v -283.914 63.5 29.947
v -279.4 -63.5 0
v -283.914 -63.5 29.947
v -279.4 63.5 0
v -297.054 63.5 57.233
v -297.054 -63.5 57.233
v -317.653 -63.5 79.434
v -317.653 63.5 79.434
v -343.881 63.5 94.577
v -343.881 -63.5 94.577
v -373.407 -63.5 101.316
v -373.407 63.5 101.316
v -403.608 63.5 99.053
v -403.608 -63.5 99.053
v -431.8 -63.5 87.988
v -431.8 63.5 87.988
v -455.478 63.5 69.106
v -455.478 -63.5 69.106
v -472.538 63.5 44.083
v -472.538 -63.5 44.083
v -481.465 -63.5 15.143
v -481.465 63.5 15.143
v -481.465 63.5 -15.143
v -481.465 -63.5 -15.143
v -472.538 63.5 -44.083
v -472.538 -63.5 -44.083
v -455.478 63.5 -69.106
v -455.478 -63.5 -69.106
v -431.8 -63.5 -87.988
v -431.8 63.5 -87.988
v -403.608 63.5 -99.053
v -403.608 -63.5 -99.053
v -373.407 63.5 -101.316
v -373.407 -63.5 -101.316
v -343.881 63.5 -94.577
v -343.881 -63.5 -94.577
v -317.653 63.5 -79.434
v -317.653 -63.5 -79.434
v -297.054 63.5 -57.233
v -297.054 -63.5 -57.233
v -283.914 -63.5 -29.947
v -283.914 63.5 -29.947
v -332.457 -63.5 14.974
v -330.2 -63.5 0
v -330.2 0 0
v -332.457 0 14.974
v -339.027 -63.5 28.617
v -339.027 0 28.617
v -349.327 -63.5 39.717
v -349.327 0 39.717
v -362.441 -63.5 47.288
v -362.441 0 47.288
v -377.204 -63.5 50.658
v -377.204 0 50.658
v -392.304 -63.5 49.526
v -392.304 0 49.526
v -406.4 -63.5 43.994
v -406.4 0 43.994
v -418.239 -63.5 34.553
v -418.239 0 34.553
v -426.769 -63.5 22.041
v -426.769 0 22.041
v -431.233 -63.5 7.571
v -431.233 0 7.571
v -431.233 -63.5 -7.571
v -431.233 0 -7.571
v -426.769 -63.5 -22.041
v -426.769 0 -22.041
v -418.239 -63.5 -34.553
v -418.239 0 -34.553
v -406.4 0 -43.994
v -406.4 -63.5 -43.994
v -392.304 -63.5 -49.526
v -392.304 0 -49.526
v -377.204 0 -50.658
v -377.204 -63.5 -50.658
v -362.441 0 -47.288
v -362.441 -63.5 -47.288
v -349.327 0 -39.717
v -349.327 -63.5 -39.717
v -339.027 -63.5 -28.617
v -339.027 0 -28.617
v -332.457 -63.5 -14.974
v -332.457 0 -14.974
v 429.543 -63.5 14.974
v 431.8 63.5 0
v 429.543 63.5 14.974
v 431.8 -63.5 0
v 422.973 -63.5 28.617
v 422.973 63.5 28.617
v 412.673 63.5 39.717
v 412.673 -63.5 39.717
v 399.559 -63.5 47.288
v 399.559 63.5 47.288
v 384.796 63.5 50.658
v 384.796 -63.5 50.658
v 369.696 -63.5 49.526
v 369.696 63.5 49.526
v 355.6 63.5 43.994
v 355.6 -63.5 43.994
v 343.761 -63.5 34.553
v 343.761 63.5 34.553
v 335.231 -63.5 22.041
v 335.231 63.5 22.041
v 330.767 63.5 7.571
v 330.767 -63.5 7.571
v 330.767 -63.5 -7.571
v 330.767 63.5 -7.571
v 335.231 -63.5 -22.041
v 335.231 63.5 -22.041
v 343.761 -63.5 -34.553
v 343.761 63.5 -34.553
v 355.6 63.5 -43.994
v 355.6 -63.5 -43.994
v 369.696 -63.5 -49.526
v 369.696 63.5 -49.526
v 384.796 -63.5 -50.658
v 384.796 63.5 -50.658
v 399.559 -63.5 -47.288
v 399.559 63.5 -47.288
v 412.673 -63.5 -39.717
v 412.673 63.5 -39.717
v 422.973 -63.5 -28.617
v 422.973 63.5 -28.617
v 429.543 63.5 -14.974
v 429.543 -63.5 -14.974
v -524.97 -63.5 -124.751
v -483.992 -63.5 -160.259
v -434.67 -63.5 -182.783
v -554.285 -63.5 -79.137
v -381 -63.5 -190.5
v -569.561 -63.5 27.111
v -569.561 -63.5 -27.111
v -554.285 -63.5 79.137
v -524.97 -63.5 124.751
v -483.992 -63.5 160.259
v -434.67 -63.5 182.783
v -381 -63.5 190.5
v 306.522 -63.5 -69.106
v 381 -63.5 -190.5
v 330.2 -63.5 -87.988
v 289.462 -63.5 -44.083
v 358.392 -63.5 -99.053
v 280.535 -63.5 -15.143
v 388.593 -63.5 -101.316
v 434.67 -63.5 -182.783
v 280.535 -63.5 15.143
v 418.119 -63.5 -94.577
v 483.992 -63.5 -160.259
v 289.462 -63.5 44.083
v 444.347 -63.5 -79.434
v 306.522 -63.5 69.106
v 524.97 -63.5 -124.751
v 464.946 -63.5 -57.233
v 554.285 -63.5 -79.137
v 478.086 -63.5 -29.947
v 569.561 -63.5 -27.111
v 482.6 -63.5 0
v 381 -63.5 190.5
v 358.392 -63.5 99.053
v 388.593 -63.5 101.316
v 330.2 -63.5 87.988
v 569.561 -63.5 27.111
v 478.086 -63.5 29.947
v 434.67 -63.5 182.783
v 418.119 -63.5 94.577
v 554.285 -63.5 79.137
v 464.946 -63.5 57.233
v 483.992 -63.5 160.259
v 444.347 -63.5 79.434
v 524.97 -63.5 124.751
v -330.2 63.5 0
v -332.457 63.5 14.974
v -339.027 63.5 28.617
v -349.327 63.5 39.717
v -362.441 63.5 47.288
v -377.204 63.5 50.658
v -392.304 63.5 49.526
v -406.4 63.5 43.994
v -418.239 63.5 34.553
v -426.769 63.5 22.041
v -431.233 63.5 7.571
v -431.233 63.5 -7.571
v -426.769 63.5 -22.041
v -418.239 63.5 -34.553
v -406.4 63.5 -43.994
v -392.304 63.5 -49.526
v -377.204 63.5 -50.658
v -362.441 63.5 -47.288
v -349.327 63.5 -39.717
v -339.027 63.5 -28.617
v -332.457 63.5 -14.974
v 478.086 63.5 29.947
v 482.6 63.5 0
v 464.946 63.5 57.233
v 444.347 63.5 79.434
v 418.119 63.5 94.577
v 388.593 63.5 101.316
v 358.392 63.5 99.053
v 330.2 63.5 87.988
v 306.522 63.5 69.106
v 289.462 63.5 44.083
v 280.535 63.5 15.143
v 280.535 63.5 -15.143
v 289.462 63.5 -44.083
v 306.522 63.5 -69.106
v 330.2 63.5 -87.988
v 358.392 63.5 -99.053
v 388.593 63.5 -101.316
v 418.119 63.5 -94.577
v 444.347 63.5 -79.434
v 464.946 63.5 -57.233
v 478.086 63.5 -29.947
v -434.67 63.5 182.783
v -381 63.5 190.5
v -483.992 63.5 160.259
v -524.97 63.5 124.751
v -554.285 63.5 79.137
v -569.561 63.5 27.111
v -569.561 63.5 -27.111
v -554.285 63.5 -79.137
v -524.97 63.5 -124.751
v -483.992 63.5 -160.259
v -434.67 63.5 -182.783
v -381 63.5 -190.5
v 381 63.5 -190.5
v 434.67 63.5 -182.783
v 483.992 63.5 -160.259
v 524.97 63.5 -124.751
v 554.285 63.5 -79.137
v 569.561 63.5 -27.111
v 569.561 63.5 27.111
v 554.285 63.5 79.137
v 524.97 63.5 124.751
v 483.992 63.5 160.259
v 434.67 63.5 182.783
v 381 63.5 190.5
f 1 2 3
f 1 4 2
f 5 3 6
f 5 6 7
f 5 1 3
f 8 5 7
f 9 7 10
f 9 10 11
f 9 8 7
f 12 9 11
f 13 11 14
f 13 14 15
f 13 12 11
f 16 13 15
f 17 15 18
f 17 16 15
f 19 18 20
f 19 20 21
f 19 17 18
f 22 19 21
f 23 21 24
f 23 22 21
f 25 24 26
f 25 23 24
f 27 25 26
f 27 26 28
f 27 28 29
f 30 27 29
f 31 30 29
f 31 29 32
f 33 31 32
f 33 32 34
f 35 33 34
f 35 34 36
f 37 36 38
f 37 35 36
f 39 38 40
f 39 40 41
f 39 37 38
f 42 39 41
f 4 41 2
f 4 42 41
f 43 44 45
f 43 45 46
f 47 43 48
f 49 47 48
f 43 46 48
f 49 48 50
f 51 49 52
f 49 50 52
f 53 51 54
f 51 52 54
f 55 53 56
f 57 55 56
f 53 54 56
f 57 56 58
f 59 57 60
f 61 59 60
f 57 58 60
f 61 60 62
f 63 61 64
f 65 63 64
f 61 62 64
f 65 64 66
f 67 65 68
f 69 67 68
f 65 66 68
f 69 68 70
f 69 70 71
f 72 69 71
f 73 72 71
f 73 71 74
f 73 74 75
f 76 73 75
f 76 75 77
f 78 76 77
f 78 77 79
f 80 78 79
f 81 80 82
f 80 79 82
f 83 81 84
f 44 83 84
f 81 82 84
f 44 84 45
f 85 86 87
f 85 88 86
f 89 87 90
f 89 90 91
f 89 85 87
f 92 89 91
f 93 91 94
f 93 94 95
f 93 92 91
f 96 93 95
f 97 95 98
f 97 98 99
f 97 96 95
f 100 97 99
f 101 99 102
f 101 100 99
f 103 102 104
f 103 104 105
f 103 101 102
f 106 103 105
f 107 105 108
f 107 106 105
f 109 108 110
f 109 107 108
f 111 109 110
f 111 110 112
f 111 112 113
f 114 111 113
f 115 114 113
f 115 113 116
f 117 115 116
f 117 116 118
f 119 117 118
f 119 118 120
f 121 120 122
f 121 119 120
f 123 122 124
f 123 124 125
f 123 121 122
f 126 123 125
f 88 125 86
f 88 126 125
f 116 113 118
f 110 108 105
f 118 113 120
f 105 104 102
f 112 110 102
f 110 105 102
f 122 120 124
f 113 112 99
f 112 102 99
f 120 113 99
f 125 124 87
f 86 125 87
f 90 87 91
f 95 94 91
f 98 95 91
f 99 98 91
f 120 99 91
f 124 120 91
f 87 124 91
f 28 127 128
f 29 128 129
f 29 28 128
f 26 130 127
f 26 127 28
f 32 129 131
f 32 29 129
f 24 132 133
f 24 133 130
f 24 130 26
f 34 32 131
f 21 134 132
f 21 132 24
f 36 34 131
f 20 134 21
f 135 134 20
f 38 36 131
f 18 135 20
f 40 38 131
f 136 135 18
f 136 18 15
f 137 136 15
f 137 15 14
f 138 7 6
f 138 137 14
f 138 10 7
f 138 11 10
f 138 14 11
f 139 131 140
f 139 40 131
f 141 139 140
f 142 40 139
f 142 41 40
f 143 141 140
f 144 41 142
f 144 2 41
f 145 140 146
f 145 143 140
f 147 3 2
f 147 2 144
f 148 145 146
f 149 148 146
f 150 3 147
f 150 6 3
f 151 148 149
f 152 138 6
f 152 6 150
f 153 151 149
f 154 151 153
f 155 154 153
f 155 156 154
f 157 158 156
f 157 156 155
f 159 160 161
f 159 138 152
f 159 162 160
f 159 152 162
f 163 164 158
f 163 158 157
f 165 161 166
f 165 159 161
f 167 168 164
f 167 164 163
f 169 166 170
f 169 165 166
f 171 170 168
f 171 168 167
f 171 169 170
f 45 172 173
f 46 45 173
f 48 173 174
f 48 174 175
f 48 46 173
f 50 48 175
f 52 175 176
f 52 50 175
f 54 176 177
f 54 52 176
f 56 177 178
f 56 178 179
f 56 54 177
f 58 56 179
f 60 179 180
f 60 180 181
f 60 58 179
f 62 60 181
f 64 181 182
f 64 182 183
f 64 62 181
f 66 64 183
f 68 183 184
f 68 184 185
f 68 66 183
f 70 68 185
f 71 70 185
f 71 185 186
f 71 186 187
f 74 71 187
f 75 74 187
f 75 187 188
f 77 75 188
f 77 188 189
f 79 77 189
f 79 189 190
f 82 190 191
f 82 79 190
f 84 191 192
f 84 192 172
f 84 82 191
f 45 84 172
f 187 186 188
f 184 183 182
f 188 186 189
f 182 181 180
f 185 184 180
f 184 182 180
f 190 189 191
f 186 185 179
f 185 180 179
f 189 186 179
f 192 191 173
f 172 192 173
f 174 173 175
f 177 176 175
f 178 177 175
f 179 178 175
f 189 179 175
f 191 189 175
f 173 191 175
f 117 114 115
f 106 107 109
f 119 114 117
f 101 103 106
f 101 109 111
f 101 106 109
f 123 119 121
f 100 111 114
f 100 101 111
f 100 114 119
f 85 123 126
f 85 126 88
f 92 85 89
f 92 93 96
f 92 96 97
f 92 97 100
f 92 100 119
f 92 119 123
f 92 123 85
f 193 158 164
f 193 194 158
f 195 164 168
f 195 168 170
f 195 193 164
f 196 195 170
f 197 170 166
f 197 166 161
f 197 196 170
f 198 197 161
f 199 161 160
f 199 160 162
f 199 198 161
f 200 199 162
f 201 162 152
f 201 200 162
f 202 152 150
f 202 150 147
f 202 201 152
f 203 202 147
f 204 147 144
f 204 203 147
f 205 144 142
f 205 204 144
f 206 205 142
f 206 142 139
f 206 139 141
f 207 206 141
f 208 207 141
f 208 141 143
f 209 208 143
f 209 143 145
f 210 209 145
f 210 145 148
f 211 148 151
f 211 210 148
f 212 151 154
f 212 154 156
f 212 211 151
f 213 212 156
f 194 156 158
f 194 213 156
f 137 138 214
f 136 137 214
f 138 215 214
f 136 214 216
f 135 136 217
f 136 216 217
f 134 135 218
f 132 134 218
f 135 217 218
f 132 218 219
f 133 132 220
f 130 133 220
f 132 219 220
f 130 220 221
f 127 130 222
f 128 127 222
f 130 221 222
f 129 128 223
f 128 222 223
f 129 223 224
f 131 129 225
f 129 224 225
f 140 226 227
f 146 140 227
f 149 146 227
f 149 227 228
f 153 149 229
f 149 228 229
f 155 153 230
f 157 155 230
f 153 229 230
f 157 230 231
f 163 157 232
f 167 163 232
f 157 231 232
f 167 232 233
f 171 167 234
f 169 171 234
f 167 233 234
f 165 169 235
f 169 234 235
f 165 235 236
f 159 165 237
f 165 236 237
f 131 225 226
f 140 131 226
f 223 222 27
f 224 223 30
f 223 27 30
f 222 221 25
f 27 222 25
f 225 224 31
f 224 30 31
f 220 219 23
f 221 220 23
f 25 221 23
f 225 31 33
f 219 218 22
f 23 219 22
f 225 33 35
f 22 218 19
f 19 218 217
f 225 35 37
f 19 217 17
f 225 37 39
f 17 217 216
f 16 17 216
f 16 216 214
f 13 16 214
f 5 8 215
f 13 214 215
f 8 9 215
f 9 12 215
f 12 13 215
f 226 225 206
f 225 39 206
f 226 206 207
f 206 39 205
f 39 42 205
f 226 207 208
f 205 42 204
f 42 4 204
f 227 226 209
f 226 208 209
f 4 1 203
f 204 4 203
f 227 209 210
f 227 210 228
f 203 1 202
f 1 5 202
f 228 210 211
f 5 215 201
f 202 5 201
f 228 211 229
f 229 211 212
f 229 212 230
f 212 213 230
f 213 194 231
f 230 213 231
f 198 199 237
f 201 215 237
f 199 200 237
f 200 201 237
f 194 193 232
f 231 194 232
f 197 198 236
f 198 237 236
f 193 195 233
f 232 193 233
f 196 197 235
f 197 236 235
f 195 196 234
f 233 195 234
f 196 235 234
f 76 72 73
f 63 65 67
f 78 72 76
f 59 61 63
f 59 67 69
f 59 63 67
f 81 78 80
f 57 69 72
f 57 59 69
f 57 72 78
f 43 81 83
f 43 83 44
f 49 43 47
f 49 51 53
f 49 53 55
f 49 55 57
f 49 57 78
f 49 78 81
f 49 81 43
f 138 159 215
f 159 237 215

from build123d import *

# Parameters (mm, degrees)
F0_R     = 101.6
F0_R_2   = 50.8
F1_DEPTH = 63.5


with BuildPart() as f1:
    # F0 (on Front) → F1 (new body, symmetric)
    with BuildSketch(Plane.XZ):
        with BuildLine():
            ThreePointArc((381, -190.5), (571.5, 0), (381, 190.5))
            Line((381, 190.5), (-381, 190.5))
            ThreePointArc((-381, 190.5), (-571.5, 0), (-381, -190.5))
            Line((-381, -190.5), (381, -190.5))
        make_face()
        with Locations((-381, 0)):
            Circle(F0_R, mode=Mode.SUBTRACT)
        with Locations((381, 0)):
            Circle(F0_R, mode=Mode.SUBTRACT)
        with Locations((-381, 0)):
            Circle(F0_R_2)
        with Locations((381, 0)):
            Circle(F0_R_2)
    extrude(amount=F1_DEPTH, both=True)


solid = f1.part
